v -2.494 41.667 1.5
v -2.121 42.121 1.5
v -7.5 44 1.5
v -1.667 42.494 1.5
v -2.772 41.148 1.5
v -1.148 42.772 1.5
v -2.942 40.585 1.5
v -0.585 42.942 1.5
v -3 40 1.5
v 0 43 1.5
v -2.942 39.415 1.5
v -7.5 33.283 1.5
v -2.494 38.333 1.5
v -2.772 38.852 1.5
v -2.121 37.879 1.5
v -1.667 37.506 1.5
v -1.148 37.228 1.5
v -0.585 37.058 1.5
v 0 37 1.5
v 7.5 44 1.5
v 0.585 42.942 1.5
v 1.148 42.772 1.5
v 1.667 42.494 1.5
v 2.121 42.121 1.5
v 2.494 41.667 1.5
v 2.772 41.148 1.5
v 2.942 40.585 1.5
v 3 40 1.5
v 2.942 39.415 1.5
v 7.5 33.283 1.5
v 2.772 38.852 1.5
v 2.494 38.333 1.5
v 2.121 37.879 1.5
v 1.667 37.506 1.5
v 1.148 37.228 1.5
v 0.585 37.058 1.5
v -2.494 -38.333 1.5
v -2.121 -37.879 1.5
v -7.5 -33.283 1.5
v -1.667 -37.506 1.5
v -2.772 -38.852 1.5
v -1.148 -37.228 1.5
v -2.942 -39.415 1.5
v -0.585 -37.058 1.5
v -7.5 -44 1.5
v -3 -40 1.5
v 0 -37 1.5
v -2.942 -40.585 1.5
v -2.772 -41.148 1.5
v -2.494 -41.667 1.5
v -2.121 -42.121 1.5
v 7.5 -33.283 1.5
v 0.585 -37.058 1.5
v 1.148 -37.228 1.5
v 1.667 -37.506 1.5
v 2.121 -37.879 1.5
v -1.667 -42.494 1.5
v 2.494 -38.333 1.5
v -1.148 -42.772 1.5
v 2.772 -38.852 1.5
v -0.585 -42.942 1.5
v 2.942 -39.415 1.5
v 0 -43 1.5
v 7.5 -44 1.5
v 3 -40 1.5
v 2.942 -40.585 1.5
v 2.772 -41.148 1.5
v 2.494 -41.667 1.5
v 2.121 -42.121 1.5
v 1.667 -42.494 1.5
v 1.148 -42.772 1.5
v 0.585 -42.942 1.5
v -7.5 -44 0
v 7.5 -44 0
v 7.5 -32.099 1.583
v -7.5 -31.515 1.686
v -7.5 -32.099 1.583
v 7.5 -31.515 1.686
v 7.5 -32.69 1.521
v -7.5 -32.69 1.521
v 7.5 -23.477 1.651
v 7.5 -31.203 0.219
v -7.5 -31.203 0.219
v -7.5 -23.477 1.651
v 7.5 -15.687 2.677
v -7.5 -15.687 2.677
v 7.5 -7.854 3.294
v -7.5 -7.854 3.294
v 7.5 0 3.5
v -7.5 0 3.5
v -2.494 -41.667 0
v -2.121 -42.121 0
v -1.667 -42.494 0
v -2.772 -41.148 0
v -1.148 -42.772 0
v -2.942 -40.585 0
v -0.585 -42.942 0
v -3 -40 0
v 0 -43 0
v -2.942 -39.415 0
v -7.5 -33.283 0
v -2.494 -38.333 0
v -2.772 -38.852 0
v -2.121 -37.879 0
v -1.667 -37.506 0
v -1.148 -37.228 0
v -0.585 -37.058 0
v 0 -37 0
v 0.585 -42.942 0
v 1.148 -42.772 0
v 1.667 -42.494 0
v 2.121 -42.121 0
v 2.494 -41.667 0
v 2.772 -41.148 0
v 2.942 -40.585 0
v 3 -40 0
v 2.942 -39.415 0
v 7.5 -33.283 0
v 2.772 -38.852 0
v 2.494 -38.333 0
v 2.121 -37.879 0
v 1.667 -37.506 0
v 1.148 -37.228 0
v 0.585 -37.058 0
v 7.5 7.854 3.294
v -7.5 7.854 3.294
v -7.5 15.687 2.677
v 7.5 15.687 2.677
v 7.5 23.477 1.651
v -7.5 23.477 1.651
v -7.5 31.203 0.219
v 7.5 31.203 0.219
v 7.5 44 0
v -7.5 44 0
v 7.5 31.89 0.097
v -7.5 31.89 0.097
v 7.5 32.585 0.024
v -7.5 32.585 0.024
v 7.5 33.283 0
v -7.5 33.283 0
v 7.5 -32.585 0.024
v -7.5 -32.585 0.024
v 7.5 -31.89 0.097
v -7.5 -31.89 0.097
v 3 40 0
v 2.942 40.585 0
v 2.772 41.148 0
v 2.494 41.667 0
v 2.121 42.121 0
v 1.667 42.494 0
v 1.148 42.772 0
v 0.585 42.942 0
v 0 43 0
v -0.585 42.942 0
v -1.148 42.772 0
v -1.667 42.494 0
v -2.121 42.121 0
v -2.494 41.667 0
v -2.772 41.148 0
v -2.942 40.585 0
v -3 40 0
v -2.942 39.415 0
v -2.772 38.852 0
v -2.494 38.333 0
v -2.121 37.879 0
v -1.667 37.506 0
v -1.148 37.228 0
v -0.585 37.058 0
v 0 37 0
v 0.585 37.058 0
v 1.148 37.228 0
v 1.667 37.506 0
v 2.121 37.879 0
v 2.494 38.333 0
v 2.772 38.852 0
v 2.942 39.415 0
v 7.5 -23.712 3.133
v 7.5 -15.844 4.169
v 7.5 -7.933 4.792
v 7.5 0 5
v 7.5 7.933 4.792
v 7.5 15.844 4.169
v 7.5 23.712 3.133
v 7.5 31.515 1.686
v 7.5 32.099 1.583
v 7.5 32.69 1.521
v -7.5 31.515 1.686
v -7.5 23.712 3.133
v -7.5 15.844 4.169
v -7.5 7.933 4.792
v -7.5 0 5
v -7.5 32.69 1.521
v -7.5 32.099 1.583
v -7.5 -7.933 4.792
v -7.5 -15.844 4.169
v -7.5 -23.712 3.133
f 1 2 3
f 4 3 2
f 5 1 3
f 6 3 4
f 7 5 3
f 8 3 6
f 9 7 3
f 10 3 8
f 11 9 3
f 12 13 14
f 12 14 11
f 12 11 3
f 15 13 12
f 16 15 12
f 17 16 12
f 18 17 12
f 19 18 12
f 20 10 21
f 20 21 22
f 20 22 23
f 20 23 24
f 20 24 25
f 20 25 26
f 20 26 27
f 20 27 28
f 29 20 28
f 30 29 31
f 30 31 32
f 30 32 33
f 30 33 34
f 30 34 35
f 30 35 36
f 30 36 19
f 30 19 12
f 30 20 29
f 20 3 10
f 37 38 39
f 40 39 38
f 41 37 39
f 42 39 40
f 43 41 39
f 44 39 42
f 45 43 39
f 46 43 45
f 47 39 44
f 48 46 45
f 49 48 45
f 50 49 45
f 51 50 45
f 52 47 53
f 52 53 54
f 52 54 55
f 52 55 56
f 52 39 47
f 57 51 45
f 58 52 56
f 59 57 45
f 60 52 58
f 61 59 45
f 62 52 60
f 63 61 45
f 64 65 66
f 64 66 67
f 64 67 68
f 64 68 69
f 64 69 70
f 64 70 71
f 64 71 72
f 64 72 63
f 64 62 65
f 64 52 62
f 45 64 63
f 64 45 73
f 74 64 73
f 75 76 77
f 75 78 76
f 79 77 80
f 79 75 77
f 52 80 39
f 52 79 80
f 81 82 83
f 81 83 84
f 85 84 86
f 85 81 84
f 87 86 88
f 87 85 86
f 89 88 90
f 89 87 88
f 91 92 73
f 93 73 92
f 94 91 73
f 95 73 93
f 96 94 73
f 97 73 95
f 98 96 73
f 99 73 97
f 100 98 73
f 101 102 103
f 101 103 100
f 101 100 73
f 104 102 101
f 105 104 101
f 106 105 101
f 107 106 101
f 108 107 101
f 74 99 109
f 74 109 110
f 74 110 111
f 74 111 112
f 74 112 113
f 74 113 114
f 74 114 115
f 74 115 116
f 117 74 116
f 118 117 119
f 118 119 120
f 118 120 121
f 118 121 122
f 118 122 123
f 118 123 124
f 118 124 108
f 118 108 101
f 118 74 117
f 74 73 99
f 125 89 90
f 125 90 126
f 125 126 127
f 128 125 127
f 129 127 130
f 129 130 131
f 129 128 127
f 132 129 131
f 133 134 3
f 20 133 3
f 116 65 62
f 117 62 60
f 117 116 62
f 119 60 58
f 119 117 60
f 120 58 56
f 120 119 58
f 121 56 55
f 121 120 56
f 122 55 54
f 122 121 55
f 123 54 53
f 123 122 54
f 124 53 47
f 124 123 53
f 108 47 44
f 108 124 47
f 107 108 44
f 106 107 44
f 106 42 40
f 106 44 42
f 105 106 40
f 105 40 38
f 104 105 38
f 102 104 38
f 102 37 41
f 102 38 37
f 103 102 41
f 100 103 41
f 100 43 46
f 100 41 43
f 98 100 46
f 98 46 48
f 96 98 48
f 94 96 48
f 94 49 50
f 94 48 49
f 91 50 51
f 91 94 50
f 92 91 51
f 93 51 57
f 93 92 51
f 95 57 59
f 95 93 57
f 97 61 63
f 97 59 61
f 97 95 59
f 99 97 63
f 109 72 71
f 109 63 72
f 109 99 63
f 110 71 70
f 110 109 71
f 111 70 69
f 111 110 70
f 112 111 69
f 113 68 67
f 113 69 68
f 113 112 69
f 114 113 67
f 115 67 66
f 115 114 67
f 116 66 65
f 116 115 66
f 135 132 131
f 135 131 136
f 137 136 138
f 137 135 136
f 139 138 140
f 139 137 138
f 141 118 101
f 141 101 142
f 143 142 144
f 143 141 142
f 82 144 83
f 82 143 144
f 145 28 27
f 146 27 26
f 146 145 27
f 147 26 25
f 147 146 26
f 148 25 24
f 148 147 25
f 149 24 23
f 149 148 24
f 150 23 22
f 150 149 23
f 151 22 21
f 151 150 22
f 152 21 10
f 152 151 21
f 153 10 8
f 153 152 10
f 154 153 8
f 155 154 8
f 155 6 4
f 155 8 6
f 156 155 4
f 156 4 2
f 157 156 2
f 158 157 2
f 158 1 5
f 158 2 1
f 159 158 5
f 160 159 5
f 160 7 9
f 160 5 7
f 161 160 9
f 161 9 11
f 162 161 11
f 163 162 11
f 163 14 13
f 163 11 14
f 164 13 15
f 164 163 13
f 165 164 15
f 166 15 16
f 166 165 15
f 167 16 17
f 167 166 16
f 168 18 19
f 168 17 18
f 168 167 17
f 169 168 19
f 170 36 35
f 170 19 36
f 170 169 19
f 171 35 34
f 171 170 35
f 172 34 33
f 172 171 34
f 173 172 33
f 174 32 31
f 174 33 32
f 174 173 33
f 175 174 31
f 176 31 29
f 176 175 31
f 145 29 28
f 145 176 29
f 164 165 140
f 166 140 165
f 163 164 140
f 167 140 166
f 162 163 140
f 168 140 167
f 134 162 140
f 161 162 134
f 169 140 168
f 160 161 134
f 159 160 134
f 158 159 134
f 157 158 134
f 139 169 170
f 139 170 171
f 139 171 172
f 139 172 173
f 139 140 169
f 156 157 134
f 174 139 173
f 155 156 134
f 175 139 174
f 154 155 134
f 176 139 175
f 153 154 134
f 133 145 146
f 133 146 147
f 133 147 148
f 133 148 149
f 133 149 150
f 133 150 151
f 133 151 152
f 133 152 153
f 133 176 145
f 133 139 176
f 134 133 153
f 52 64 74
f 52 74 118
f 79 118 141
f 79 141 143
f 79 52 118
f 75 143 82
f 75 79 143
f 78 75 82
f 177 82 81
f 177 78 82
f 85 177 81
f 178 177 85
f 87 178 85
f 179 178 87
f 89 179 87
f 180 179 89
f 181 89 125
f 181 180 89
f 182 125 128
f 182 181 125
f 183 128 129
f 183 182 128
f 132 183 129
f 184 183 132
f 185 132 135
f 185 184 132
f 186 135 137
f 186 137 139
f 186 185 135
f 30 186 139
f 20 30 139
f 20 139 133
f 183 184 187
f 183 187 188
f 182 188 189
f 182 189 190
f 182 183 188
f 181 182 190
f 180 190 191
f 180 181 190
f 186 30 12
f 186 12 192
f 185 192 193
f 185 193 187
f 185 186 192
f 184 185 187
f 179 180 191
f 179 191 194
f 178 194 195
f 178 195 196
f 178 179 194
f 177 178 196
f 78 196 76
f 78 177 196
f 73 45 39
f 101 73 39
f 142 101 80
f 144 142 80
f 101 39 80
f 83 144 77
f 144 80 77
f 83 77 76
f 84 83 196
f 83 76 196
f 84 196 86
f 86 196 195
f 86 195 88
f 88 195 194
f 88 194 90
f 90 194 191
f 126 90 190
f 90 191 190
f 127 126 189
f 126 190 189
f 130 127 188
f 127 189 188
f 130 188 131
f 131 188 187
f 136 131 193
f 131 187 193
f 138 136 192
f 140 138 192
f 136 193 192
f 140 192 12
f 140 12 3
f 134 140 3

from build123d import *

# Parameters (mm, degrees)
F1_DEPTH      = 7.5
F1_DEPTH_BACK = 7.5
F2_R          = 3
F3_DEPTH      = 5.001


with BuildPart() as f1:
    # F0 (on Right) → F1 (new body, two sides)
    with BuildSketch(Plane.YZ) as f1_sk:
        with BuildLine():
            Line((-44, 1.5), (-44, 0))
            Line((-44, 0), (-33.282878, 0))
            ThreePointArc((-33.282878, 0), (-32.237053, 0.054838), (-31.202699, 0.21875))
            ThreePointArc((-31.202699, 0.21875), (-15.687375, 2.677432), (0, 3.5))
            ThreePointArc((0, 3.5), (15.687375, 2.677432), (31.202699, 0.21875))
            ThreePointArc((31.202699, 0.21875), (32.237053, 0.054838), (33.282878, 0))
            Line((33.282878, 0), (44, 0))
            Line((44, 0), (44, 1.5))
            Line((44, 1.5), (33.282878, 1.5))
            ThreePointArc((33.282878, 1.5), (32.393927, 1.546612), (31.514726, 1.685938))
            ThreePointArc((31.514726, 1.685938), (15.844249, 4.169206), (0, 5))
            ThreePointArc((0, 5), (-15.844249, 4.169206), (-31.514726, 1.685938))
            ThreePointArc((-31.514726, 1.685938), (-32.393927, 1.546612), (-33.282878, 1.5))
            Line((-33.282878, 1.5), (-44, 1.5))
        make_face()
    extrude(amount=F1_DEPTH)
    extrude(f1_sk.sketch, amount=-F1_DEPTH_BACK)

    # F2 (on Top) → F3 (cut, through all)
    with BuildSketch(Plane.XY):
        with Locations((0, 40)):
            Circle(F2_R)
        with Locations((0, -40)):
            Circle(F2_R)
    extrude(amount=F3_DEPTH, mode=Mode.SUBTRACT)


solid = f1.part
